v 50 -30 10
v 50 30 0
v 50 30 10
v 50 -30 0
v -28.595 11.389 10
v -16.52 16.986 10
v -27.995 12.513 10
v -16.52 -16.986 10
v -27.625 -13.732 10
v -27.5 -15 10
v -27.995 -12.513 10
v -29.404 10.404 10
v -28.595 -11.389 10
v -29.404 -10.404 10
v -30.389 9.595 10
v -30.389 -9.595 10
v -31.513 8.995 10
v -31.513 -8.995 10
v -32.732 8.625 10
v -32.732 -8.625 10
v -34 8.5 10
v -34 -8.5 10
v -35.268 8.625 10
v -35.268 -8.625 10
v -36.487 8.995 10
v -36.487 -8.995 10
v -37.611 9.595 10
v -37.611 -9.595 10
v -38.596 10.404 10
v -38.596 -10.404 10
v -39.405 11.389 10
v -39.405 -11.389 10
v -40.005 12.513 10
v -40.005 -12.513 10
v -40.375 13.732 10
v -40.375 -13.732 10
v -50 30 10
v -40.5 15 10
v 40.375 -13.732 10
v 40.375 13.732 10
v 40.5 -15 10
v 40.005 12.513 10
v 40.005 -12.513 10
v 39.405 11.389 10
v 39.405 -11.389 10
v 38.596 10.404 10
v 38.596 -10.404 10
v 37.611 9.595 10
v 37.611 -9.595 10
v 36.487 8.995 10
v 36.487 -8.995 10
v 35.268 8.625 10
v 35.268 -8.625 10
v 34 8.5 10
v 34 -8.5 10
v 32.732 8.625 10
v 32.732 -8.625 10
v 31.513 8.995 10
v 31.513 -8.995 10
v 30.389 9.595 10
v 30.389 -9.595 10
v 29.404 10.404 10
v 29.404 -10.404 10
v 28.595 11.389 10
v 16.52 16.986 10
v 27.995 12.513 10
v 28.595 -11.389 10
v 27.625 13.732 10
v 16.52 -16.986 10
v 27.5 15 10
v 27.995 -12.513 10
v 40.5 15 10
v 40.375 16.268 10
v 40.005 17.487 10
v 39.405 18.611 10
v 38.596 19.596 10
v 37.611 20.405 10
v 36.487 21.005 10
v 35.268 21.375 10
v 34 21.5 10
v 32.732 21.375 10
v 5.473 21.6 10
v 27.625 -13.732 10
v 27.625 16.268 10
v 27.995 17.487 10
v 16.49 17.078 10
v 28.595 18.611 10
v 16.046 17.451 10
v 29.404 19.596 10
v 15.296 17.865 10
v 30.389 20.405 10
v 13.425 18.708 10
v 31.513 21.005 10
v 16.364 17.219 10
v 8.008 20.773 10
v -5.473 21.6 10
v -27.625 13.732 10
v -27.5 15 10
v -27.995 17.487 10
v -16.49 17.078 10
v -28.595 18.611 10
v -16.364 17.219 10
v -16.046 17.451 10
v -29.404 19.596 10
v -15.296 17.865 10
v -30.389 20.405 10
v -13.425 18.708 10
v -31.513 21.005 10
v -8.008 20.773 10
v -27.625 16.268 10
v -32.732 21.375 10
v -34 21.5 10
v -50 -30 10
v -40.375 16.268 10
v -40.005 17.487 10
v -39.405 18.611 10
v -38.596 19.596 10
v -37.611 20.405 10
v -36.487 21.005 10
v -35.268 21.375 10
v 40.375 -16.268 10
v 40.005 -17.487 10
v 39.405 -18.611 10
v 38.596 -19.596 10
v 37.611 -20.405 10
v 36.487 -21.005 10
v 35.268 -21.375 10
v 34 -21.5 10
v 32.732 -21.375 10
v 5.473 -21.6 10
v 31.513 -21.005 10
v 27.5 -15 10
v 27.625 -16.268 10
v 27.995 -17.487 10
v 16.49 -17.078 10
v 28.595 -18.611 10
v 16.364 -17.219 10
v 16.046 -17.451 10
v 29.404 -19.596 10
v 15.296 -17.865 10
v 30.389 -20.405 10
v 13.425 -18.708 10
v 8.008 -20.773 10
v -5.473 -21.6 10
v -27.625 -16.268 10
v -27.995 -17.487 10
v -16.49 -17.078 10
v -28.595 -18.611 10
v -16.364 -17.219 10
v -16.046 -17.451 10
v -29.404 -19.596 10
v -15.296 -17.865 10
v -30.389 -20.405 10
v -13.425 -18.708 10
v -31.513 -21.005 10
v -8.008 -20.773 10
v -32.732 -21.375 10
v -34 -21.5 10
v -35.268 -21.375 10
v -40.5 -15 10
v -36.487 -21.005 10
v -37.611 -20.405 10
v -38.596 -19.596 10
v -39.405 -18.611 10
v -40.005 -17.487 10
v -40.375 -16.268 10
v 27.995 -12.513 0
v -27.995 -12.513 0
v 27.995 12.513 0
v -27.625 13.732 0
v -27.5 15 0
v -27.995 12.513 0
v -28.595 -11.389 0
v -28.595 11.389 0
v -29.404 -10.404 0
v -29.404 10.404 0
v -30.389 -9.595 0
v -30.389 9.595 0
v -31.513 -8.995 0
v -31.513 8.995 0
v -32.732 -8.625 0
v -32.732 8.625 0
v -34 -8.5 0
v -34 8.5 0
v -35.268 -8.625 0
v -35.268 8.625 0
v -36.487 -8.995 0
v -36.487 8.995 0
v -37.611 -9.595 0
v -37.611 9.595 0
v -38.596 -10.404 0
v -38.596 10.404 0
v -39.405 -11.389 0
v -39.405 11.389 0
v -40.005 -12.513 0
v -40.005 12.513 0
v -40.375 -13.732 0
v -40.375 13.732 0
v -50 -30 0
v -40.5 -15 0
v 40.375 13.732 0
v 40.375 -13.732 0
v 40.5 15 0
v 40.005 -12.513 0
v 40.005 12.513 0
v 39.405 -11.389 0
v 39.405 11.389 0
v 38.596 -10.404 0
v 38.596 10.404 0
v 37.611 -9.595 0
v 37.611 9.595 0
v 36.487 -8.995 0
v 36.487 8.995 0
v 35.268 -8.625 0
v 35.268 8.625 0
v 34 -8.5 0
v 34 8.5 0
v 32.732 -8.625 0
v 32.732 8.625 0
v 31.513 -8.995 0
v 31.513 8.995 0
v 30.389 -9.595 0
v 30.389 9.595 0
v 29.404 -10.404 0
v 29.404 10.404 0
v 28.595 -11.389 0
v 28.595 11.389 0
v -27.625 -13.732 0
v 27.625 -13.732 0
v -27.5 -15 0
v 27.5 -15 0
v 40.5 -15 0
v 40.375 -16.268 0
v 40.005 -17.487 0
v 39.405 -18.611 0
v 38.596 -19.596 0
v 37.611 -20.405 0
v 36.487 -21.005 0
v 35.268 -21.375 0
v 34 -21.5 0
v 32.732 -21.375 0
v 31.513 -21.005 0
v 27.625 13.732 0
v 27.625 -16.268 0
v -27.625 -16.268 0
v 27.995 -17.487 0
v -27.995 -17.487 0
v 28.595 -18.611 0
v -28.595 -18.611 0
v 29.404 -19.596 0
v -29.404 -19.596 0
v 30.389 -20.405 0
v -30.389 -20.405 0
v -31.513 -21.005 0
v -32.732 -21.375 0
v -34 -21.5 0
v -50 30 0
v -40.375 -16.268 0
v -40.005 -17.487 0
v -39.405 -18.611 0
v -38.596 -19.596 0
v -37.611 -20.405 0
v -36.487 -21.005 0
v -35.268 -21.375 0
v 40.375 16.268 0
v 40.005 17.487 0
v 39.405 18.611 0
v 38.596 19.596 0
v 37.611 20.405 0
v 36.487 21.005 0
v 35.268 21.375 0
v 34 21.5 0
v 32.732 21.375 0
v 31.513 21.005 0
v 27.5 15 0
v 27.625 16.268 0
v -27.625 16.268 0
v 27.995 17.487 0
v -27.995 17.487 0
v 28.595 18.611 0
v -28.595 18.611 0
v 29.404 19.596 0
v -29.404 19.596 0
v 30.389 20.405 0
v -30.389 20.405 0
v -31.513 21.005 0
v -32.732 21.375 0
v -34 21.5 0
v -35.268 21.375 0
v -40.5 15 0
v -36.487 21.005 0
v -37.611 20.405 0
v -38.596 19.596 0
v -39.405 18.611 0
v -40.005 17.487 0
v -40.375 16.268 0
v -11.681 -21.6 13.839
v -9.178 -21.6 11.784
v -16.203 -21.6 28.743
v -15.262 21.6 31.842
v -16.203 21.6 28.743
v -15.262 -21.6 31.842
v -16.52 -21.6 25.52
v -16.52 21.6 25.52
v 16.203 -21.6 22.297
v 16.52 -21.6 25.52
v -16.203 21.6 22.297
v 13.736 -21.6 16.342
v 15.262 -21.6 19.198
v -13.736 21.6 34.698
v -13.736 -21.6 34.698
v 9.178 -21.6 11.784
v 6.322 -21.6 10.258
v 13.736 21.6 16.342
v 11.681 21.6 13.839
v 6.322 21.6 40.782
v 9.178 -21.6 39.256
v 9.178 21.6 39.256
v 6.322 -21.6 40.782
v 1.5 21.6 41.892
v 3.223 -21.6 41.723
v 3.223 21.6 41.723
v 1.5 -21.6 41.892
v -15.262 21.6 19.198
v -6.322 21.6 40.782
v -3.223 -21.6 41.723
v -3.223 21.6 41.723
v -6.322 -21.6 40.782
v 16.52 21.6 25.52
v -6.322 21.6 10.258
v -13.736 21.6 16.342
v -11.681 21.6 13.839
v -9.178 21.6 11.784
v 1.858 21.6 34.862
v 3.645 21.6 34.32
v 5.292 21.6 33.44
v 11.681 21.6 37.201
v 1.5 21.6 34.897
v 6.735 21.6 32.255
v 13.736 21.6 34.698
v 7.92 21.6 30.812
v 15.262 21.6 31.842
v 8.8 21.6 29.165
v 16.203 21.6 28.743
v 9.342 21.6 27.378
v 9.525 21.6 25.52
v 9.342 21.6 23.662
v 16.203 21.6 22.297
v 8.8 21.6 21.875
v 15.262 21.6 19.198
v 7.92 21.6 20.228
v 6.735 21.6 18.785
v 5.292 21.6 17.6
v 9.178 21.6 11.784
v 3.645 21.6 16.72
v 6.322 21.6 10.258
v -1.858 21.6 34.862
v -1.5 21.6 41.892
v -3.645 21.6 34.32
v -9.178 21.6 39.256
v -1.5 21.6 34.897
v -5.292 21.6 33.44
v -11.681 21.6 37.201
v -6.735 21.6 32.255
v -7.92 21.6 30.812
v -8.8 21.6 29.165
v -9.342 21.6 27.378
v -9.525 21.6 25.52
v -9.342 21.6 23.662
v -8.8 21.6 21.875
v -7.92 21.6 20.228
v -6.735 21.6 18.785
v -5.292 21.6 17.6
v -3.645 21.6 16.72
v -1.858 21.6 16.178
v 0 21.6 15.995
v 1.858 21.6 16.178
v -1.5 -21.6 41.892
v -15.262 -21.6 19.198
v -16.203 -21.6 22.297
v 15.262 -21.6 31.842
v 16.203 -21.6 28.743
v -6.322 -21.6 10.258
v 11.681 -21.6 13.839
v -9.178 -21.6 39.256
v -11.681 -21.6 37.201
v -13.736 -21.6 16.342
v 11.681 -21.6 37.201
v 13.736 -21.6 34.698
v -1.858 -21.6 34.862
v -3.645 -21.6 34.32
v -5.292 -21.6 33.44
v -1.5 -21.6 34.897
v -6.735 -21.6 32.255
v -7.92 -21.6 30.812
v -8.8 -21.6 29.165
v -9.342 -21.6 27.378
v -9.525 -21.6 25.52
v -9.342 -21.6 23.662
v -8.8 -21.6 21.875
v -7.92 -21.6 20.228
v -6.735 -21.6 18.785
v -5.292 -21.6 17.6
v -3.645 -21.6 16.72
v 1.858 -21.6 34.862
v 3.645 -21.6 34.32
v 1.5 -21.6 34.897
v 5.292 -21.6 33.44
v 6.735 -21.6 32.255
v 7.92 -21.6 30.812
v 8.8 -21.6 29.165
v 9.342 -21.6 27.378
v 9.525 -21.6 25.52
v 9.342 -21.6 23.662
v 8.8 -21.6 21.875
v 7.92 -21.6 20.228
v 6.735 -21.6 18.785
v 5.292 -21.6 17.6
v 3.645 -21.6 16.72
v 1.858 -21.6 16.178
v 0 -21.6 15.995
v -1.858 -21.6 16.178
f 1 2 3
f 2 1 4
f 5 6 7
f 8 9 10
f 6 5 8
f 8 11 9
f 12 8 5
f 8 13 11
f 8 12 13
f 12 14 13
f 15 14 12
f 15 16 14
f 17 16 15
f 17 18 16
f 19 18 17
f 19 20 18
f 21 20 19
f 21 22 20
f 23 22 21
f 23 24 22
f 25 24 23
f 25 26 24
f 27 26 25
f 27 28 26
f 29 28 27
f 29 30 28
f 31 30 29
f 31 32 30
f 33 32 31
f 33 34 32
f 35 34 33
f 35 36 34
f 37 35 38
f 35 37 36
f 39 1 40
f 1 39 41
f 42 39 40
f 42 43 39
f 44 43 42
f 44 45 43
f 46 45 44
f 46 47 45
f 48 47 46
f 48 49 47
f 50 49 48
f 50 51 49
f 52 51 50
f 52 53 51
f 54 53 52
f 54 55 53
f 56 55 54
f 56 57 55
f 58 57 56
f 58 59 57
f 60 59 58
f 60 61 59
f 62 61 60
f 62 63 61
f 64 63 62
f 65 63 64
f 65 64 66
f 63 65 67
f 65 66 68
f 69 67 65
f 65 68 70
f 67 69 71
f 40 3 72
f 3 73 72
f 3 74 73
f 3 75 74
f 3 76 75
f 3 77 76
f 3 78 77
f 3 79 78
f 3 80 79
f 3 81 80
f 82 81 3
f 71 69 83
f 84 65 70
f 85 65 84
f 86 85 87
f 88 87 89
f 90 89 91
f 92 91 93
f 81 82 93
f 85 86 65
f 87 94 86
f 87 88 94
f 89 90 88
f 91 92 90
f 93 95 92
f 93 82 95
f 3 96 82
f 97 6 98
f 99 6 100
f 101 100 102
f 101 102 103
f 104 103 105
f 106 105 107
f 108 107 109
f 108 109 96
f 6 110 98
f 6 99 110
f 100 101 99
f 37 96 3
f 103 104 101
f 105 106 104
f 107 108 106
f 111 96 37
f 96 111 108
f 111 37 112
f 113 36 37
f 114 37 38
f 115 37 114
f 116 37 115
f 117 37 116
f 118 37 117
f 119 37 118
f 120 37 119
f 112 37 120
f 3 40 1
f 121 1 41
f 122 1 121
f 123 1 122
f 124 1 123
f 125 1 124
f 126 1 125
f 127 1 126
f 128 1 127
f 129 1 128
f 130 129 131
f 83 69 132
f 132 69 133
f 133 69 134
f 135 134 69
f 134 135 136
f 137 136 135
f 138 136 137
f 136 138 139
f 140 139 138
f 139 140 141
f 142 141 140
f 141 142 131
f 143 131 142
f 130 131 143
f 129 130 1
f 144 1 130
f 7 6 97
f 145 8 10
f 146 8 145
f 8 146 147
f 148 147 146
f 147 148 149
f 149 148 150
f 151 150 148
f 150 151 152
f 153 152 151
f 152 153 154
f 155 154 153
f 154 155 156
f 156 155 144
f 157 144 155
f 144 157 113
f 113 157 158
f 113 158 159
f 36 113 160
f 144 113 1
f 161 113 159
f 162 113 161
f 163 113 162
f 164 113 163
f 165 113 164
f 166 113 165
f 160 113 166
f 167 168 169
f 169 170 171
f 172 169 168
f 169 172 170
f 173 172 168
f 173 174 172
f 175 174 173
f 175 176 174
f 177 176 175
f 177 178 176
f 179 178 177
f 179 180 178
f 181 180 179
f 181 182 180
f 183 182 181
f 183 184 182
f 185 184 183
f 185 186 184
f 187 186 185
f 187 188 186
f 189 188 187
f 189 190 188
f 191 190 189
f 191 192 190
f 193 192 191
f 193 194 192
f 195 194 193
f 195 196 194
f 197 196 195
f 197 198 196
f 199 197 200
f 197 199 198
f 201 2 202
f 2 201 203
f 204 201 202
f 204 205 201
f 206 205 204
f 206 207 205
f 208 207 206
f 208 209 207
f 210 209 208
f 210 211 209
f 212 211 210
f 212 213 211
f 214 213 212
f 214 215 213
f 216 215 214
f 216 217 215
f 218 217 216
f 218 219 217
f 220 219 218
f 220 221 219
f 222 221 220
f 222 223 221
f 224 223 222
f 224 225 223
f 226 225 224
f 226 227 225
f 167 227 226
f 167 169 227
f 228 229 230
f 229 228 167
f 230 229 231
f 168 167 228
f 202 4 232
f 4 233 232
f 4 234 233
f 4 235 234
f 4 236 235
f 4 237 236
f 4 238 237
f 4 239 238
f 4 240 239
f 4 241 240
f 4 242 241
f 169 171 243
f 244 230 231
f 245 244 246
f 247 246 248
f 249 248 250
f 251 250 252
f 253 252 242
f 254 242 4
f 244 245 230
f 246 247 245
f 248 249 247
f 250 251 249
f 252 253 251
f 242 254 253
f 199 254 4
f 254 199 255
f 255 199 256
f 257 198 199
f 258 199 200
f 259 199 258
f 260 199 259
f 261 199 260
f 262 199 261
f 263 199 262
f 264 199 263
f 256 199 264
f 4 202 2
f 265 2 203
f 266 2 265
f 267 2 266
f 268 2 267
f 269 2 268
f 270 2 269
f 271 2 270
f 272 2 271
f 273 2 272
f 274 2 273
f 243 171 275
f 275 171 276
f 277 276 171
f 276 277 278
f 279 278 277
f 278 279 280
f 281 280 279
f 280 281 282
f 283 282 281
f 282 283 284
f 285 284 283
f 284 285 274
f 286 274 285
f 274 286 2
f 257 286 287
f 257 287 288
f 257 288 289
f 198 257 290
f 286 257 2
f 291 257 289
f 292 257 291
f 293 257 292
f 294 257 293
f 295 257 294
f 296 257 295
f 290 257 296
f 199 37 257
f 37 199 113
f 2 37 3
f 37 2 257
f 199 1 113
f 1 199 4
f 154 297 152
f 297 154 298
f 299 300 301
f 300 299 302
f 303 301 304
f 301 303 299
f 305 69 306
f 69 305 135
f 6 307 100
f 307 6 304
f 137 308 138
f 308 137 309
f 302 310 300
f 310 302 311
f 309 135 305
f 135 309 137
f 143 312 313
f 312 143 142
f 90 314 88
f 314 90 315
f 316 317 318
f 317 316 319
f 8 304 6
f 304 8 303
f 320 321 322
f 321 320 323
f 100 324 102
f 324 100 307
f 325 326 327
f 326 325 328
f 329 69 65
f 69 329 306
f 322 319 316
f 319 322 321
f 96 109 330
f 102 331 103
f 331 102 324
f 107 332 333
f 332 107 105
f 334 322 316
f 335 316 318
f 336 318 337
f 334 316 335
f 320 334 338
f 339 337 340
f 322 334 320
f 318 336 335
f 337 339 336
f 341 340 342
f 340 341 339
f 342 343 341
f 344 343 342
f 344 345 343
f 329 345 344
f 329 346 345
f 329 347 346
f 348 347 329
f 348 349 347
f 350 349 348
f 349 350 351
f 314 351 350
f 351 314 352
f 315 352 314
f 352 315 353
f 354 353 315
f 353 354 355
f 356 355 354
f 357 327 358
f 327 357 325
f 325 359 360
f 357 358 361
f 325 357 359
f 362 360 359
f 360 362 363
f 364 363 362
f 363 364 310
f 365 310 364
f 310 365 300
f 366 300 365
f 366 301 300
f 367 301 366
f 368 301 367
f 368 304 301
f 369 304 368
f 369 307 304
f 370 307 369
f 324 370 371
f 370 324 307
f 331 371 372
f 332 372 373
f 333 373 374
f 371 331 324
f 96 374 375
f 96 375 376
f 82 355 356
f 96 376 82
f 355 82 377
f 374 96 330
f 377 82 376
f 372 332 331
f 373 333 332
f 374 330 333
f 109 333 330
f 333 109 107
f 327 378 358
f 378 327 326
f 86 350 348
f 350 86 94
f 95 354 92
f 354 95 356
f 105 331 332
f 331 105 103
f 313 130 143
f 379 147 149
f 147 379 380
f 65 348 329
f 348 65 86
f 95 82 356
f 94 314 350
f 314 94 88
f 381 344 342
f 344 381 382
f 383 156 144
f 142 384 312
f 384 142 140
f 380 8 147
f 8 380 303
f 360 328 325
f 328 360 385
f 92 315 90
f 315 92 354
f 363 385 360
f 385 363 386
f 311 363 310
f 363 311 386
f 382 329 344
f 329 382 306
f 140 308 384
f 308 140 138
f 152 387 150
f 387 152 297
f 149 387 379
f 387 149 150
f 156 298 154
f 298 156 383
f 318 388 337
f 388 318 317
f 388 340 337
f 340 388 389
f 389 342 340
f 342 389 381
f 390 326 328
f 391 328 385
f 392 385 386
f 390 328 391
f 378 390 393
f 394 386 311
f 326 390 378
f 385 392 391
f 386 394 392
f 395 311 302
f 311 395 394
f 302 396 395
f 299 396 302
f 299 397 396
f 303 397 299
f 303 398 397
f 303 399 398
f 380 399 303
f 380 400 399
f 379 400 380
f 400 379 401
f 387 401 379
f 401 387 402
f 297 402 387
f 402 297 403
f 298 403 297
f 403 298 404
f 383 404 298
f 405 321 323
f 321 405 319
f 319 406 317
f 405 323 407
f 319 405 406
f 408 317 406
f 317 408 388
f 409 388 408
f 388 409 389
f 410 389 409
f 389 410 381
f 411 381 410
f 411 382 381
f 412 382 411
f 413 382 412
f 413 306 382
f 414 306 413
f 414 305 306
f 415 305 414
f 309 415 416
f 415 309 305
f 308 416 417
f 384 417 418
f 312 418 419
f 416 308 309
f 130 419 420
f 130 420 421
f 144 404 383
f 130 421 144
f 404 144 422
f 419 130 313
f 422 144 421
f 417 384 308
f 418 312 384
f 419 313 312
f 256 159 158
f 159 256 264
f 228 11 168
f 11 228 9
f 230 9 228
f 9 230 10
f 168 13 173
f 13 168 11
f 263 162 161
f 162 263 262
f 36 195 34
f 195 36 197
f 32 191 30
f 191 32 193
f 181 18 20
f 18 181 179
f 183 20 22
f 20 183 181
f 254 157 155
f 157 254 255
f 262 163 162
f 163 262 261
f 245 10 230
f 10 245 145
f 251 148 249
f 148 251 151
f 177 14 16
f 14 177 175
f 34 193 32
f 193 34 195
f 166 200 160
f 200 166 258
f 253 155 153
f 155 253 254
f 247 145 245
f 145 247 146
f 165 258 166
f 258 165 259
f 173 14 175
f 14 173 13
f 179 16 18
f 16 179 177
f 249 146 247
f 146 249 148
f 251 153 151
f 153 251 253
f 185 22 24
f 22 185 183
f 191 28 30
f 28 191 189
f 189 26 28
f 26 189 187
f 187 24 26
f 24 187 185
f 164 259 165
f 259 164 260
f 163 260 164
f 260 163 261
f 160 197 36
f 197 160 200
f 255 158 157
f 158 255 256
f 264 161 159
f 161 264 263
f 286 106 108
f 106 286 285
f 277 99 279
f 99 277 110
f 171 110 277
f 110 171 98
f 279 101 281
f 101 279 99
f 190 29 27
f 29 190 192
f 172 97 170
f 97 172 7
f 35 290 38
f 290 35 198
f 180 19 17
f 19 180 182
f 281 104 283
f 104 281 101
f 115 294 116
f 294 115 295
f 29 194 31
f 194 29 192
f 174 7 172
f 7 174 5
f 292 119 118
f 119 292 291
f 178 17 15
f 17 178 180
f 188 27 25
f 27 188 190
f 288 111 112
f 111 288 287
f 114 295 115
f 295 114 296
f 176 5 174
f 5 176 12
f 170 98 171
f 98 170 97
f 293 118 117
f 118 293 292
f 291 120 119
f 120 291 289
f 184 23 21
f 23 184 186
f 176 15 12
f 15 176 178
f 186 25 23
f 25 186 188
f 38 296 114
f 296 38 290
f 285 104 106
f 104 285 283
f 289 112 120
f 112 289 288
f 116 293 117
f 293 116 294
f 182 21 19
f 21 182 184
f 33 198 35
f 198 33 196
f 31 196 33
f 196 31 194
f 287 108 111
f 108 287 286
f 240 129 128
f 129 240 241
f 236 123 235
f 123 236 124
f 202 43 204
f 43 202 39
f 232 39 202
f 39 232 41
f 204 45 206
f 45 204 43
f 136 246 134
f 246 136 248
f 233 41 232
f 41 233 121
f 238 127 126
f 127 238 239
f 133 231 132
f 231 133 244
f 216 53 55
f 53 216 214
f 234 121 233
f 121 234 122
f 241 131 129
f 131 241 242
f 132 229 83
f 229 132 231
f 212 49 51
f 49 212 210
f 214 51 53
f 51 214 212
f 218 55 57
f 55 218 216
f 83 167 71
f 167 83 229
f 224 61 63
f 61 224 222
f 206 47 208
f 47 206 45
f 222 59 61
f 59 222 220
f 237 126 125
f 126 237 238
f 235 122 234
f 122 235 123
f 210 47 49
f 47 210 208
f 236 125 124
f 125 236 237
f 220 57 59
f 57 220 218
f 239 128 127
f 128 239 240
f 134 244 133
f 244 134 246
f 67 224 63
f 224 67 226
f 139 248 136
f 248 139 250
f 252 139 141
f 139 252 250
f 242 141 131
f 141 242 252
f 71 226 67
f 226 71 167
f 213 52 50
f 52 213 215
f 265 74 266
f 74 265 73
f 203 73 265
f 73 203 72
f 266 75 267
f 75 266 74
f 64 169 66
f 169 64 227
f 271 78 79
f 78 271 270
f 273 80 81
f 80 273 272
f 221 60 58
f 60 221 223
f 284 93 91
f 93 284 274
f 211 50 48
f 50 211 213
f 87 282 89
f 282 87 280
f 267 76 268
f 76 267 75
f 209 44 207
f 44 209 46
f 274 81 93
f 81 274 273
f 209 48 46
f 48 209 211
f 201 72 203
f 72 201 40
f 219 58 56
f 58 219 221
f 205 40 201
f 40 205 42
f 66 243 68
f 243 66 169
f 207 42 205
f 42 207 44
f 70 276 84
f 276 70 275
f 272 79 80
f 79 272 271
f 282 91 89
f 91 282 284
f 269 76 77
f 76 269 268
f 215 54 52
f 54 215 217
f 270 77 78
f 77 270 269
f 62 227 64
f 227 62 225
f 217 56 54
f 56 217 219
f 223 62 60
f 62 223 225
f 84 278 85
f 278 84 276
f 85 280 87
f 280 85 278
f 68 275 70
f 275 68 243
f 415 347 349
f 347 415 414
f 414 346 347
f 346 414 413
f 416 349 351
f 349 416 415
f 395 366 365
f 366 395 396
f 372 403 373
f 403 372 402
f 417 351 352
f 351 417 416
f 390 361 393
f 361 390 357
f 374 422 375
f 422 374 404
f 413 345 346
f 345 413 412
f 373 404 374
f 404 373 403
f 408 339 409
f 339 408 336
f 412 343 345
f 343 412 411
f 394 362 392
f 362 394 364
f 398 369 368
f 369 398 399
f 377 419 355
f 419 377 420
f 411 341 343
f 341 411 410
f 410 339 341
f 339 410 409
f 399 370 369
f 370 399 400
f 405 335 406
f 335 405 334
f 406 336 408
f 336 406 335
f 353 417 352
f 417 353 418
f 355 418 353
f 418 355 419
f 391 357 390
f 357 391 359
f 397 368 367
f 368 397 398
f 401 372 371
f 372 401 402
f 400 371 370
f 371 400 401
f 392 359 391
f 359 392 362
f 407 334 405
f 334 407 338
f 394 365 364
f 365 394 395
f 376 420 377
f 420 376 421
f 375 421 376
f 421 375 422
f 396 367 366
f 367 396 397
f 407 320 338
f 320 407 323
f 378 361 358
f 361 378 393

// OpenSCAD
$fn = 32;

// ----------------------------------------------------------------------
// Bearing block: 100 x 60 mm base, 19.05 mm bore at 25.52 mm
// ----------------------------------------------------------------------

// --- parameters (mm) ---
base_w = 100;             // base width
base_d = 60;              // base depth
base_t = 10;              // base thickness
bore_d = 19.05;           // shaft / bearing bore
house_r = 16.52;          // housing outer radius
house_len = 43.2;         // housing length along the shaft
foot_w = 33.04;           // foot width under the housing
foot_len = 33.2;          // foot length along the shaft
axis_z = 25.52;           // bore axis height above the base
holes_d = 13;             // mounting holes
hole_x = 34;              // mounting hole spacing
groove_w = 3;             // oil groove width

difference() {
  union() {
    /* base plate with its underside on z = 0 */
    translate([0, 0, base_t / 2]) cube([base_w, base_d, base_t], center = true);
    /* hull foot: a straight web blending into the round housing */
    hull() {
      translate([0, 0, base_t - 0.5]) cube([foot_w, foot_len, 1.6], center = true);
      translate([0, 0, axis_z]) rotate([-90, 0, 0]) cylinder(h = house_len, d = 2 * house_r, center = true);
    }
  }
  /* bore through the housing, 2.5 mm clear on both sides */
  translate([0, 0, axis_z]) rotate([-90, 0, 0]) cylinder(h = house_len + 5, d = bore_d, center = true);
  /* oil groove from the top of the housing into the bore */
  translate([-groove_w / 2, -house_len / 2 - 2.5, axis_z + bore_d * 0.17]) cube([groove_w, house_len + 5, house_r + 5]);
  /* mounting holes through the base plate */
  for (hx = [-34, 34]) {
    for (hy = [-15, 15]) {
      translate([hx, hy, -2.5]) cylinder(h = base_t + 5, d = holes_d);
    }
  }
}
